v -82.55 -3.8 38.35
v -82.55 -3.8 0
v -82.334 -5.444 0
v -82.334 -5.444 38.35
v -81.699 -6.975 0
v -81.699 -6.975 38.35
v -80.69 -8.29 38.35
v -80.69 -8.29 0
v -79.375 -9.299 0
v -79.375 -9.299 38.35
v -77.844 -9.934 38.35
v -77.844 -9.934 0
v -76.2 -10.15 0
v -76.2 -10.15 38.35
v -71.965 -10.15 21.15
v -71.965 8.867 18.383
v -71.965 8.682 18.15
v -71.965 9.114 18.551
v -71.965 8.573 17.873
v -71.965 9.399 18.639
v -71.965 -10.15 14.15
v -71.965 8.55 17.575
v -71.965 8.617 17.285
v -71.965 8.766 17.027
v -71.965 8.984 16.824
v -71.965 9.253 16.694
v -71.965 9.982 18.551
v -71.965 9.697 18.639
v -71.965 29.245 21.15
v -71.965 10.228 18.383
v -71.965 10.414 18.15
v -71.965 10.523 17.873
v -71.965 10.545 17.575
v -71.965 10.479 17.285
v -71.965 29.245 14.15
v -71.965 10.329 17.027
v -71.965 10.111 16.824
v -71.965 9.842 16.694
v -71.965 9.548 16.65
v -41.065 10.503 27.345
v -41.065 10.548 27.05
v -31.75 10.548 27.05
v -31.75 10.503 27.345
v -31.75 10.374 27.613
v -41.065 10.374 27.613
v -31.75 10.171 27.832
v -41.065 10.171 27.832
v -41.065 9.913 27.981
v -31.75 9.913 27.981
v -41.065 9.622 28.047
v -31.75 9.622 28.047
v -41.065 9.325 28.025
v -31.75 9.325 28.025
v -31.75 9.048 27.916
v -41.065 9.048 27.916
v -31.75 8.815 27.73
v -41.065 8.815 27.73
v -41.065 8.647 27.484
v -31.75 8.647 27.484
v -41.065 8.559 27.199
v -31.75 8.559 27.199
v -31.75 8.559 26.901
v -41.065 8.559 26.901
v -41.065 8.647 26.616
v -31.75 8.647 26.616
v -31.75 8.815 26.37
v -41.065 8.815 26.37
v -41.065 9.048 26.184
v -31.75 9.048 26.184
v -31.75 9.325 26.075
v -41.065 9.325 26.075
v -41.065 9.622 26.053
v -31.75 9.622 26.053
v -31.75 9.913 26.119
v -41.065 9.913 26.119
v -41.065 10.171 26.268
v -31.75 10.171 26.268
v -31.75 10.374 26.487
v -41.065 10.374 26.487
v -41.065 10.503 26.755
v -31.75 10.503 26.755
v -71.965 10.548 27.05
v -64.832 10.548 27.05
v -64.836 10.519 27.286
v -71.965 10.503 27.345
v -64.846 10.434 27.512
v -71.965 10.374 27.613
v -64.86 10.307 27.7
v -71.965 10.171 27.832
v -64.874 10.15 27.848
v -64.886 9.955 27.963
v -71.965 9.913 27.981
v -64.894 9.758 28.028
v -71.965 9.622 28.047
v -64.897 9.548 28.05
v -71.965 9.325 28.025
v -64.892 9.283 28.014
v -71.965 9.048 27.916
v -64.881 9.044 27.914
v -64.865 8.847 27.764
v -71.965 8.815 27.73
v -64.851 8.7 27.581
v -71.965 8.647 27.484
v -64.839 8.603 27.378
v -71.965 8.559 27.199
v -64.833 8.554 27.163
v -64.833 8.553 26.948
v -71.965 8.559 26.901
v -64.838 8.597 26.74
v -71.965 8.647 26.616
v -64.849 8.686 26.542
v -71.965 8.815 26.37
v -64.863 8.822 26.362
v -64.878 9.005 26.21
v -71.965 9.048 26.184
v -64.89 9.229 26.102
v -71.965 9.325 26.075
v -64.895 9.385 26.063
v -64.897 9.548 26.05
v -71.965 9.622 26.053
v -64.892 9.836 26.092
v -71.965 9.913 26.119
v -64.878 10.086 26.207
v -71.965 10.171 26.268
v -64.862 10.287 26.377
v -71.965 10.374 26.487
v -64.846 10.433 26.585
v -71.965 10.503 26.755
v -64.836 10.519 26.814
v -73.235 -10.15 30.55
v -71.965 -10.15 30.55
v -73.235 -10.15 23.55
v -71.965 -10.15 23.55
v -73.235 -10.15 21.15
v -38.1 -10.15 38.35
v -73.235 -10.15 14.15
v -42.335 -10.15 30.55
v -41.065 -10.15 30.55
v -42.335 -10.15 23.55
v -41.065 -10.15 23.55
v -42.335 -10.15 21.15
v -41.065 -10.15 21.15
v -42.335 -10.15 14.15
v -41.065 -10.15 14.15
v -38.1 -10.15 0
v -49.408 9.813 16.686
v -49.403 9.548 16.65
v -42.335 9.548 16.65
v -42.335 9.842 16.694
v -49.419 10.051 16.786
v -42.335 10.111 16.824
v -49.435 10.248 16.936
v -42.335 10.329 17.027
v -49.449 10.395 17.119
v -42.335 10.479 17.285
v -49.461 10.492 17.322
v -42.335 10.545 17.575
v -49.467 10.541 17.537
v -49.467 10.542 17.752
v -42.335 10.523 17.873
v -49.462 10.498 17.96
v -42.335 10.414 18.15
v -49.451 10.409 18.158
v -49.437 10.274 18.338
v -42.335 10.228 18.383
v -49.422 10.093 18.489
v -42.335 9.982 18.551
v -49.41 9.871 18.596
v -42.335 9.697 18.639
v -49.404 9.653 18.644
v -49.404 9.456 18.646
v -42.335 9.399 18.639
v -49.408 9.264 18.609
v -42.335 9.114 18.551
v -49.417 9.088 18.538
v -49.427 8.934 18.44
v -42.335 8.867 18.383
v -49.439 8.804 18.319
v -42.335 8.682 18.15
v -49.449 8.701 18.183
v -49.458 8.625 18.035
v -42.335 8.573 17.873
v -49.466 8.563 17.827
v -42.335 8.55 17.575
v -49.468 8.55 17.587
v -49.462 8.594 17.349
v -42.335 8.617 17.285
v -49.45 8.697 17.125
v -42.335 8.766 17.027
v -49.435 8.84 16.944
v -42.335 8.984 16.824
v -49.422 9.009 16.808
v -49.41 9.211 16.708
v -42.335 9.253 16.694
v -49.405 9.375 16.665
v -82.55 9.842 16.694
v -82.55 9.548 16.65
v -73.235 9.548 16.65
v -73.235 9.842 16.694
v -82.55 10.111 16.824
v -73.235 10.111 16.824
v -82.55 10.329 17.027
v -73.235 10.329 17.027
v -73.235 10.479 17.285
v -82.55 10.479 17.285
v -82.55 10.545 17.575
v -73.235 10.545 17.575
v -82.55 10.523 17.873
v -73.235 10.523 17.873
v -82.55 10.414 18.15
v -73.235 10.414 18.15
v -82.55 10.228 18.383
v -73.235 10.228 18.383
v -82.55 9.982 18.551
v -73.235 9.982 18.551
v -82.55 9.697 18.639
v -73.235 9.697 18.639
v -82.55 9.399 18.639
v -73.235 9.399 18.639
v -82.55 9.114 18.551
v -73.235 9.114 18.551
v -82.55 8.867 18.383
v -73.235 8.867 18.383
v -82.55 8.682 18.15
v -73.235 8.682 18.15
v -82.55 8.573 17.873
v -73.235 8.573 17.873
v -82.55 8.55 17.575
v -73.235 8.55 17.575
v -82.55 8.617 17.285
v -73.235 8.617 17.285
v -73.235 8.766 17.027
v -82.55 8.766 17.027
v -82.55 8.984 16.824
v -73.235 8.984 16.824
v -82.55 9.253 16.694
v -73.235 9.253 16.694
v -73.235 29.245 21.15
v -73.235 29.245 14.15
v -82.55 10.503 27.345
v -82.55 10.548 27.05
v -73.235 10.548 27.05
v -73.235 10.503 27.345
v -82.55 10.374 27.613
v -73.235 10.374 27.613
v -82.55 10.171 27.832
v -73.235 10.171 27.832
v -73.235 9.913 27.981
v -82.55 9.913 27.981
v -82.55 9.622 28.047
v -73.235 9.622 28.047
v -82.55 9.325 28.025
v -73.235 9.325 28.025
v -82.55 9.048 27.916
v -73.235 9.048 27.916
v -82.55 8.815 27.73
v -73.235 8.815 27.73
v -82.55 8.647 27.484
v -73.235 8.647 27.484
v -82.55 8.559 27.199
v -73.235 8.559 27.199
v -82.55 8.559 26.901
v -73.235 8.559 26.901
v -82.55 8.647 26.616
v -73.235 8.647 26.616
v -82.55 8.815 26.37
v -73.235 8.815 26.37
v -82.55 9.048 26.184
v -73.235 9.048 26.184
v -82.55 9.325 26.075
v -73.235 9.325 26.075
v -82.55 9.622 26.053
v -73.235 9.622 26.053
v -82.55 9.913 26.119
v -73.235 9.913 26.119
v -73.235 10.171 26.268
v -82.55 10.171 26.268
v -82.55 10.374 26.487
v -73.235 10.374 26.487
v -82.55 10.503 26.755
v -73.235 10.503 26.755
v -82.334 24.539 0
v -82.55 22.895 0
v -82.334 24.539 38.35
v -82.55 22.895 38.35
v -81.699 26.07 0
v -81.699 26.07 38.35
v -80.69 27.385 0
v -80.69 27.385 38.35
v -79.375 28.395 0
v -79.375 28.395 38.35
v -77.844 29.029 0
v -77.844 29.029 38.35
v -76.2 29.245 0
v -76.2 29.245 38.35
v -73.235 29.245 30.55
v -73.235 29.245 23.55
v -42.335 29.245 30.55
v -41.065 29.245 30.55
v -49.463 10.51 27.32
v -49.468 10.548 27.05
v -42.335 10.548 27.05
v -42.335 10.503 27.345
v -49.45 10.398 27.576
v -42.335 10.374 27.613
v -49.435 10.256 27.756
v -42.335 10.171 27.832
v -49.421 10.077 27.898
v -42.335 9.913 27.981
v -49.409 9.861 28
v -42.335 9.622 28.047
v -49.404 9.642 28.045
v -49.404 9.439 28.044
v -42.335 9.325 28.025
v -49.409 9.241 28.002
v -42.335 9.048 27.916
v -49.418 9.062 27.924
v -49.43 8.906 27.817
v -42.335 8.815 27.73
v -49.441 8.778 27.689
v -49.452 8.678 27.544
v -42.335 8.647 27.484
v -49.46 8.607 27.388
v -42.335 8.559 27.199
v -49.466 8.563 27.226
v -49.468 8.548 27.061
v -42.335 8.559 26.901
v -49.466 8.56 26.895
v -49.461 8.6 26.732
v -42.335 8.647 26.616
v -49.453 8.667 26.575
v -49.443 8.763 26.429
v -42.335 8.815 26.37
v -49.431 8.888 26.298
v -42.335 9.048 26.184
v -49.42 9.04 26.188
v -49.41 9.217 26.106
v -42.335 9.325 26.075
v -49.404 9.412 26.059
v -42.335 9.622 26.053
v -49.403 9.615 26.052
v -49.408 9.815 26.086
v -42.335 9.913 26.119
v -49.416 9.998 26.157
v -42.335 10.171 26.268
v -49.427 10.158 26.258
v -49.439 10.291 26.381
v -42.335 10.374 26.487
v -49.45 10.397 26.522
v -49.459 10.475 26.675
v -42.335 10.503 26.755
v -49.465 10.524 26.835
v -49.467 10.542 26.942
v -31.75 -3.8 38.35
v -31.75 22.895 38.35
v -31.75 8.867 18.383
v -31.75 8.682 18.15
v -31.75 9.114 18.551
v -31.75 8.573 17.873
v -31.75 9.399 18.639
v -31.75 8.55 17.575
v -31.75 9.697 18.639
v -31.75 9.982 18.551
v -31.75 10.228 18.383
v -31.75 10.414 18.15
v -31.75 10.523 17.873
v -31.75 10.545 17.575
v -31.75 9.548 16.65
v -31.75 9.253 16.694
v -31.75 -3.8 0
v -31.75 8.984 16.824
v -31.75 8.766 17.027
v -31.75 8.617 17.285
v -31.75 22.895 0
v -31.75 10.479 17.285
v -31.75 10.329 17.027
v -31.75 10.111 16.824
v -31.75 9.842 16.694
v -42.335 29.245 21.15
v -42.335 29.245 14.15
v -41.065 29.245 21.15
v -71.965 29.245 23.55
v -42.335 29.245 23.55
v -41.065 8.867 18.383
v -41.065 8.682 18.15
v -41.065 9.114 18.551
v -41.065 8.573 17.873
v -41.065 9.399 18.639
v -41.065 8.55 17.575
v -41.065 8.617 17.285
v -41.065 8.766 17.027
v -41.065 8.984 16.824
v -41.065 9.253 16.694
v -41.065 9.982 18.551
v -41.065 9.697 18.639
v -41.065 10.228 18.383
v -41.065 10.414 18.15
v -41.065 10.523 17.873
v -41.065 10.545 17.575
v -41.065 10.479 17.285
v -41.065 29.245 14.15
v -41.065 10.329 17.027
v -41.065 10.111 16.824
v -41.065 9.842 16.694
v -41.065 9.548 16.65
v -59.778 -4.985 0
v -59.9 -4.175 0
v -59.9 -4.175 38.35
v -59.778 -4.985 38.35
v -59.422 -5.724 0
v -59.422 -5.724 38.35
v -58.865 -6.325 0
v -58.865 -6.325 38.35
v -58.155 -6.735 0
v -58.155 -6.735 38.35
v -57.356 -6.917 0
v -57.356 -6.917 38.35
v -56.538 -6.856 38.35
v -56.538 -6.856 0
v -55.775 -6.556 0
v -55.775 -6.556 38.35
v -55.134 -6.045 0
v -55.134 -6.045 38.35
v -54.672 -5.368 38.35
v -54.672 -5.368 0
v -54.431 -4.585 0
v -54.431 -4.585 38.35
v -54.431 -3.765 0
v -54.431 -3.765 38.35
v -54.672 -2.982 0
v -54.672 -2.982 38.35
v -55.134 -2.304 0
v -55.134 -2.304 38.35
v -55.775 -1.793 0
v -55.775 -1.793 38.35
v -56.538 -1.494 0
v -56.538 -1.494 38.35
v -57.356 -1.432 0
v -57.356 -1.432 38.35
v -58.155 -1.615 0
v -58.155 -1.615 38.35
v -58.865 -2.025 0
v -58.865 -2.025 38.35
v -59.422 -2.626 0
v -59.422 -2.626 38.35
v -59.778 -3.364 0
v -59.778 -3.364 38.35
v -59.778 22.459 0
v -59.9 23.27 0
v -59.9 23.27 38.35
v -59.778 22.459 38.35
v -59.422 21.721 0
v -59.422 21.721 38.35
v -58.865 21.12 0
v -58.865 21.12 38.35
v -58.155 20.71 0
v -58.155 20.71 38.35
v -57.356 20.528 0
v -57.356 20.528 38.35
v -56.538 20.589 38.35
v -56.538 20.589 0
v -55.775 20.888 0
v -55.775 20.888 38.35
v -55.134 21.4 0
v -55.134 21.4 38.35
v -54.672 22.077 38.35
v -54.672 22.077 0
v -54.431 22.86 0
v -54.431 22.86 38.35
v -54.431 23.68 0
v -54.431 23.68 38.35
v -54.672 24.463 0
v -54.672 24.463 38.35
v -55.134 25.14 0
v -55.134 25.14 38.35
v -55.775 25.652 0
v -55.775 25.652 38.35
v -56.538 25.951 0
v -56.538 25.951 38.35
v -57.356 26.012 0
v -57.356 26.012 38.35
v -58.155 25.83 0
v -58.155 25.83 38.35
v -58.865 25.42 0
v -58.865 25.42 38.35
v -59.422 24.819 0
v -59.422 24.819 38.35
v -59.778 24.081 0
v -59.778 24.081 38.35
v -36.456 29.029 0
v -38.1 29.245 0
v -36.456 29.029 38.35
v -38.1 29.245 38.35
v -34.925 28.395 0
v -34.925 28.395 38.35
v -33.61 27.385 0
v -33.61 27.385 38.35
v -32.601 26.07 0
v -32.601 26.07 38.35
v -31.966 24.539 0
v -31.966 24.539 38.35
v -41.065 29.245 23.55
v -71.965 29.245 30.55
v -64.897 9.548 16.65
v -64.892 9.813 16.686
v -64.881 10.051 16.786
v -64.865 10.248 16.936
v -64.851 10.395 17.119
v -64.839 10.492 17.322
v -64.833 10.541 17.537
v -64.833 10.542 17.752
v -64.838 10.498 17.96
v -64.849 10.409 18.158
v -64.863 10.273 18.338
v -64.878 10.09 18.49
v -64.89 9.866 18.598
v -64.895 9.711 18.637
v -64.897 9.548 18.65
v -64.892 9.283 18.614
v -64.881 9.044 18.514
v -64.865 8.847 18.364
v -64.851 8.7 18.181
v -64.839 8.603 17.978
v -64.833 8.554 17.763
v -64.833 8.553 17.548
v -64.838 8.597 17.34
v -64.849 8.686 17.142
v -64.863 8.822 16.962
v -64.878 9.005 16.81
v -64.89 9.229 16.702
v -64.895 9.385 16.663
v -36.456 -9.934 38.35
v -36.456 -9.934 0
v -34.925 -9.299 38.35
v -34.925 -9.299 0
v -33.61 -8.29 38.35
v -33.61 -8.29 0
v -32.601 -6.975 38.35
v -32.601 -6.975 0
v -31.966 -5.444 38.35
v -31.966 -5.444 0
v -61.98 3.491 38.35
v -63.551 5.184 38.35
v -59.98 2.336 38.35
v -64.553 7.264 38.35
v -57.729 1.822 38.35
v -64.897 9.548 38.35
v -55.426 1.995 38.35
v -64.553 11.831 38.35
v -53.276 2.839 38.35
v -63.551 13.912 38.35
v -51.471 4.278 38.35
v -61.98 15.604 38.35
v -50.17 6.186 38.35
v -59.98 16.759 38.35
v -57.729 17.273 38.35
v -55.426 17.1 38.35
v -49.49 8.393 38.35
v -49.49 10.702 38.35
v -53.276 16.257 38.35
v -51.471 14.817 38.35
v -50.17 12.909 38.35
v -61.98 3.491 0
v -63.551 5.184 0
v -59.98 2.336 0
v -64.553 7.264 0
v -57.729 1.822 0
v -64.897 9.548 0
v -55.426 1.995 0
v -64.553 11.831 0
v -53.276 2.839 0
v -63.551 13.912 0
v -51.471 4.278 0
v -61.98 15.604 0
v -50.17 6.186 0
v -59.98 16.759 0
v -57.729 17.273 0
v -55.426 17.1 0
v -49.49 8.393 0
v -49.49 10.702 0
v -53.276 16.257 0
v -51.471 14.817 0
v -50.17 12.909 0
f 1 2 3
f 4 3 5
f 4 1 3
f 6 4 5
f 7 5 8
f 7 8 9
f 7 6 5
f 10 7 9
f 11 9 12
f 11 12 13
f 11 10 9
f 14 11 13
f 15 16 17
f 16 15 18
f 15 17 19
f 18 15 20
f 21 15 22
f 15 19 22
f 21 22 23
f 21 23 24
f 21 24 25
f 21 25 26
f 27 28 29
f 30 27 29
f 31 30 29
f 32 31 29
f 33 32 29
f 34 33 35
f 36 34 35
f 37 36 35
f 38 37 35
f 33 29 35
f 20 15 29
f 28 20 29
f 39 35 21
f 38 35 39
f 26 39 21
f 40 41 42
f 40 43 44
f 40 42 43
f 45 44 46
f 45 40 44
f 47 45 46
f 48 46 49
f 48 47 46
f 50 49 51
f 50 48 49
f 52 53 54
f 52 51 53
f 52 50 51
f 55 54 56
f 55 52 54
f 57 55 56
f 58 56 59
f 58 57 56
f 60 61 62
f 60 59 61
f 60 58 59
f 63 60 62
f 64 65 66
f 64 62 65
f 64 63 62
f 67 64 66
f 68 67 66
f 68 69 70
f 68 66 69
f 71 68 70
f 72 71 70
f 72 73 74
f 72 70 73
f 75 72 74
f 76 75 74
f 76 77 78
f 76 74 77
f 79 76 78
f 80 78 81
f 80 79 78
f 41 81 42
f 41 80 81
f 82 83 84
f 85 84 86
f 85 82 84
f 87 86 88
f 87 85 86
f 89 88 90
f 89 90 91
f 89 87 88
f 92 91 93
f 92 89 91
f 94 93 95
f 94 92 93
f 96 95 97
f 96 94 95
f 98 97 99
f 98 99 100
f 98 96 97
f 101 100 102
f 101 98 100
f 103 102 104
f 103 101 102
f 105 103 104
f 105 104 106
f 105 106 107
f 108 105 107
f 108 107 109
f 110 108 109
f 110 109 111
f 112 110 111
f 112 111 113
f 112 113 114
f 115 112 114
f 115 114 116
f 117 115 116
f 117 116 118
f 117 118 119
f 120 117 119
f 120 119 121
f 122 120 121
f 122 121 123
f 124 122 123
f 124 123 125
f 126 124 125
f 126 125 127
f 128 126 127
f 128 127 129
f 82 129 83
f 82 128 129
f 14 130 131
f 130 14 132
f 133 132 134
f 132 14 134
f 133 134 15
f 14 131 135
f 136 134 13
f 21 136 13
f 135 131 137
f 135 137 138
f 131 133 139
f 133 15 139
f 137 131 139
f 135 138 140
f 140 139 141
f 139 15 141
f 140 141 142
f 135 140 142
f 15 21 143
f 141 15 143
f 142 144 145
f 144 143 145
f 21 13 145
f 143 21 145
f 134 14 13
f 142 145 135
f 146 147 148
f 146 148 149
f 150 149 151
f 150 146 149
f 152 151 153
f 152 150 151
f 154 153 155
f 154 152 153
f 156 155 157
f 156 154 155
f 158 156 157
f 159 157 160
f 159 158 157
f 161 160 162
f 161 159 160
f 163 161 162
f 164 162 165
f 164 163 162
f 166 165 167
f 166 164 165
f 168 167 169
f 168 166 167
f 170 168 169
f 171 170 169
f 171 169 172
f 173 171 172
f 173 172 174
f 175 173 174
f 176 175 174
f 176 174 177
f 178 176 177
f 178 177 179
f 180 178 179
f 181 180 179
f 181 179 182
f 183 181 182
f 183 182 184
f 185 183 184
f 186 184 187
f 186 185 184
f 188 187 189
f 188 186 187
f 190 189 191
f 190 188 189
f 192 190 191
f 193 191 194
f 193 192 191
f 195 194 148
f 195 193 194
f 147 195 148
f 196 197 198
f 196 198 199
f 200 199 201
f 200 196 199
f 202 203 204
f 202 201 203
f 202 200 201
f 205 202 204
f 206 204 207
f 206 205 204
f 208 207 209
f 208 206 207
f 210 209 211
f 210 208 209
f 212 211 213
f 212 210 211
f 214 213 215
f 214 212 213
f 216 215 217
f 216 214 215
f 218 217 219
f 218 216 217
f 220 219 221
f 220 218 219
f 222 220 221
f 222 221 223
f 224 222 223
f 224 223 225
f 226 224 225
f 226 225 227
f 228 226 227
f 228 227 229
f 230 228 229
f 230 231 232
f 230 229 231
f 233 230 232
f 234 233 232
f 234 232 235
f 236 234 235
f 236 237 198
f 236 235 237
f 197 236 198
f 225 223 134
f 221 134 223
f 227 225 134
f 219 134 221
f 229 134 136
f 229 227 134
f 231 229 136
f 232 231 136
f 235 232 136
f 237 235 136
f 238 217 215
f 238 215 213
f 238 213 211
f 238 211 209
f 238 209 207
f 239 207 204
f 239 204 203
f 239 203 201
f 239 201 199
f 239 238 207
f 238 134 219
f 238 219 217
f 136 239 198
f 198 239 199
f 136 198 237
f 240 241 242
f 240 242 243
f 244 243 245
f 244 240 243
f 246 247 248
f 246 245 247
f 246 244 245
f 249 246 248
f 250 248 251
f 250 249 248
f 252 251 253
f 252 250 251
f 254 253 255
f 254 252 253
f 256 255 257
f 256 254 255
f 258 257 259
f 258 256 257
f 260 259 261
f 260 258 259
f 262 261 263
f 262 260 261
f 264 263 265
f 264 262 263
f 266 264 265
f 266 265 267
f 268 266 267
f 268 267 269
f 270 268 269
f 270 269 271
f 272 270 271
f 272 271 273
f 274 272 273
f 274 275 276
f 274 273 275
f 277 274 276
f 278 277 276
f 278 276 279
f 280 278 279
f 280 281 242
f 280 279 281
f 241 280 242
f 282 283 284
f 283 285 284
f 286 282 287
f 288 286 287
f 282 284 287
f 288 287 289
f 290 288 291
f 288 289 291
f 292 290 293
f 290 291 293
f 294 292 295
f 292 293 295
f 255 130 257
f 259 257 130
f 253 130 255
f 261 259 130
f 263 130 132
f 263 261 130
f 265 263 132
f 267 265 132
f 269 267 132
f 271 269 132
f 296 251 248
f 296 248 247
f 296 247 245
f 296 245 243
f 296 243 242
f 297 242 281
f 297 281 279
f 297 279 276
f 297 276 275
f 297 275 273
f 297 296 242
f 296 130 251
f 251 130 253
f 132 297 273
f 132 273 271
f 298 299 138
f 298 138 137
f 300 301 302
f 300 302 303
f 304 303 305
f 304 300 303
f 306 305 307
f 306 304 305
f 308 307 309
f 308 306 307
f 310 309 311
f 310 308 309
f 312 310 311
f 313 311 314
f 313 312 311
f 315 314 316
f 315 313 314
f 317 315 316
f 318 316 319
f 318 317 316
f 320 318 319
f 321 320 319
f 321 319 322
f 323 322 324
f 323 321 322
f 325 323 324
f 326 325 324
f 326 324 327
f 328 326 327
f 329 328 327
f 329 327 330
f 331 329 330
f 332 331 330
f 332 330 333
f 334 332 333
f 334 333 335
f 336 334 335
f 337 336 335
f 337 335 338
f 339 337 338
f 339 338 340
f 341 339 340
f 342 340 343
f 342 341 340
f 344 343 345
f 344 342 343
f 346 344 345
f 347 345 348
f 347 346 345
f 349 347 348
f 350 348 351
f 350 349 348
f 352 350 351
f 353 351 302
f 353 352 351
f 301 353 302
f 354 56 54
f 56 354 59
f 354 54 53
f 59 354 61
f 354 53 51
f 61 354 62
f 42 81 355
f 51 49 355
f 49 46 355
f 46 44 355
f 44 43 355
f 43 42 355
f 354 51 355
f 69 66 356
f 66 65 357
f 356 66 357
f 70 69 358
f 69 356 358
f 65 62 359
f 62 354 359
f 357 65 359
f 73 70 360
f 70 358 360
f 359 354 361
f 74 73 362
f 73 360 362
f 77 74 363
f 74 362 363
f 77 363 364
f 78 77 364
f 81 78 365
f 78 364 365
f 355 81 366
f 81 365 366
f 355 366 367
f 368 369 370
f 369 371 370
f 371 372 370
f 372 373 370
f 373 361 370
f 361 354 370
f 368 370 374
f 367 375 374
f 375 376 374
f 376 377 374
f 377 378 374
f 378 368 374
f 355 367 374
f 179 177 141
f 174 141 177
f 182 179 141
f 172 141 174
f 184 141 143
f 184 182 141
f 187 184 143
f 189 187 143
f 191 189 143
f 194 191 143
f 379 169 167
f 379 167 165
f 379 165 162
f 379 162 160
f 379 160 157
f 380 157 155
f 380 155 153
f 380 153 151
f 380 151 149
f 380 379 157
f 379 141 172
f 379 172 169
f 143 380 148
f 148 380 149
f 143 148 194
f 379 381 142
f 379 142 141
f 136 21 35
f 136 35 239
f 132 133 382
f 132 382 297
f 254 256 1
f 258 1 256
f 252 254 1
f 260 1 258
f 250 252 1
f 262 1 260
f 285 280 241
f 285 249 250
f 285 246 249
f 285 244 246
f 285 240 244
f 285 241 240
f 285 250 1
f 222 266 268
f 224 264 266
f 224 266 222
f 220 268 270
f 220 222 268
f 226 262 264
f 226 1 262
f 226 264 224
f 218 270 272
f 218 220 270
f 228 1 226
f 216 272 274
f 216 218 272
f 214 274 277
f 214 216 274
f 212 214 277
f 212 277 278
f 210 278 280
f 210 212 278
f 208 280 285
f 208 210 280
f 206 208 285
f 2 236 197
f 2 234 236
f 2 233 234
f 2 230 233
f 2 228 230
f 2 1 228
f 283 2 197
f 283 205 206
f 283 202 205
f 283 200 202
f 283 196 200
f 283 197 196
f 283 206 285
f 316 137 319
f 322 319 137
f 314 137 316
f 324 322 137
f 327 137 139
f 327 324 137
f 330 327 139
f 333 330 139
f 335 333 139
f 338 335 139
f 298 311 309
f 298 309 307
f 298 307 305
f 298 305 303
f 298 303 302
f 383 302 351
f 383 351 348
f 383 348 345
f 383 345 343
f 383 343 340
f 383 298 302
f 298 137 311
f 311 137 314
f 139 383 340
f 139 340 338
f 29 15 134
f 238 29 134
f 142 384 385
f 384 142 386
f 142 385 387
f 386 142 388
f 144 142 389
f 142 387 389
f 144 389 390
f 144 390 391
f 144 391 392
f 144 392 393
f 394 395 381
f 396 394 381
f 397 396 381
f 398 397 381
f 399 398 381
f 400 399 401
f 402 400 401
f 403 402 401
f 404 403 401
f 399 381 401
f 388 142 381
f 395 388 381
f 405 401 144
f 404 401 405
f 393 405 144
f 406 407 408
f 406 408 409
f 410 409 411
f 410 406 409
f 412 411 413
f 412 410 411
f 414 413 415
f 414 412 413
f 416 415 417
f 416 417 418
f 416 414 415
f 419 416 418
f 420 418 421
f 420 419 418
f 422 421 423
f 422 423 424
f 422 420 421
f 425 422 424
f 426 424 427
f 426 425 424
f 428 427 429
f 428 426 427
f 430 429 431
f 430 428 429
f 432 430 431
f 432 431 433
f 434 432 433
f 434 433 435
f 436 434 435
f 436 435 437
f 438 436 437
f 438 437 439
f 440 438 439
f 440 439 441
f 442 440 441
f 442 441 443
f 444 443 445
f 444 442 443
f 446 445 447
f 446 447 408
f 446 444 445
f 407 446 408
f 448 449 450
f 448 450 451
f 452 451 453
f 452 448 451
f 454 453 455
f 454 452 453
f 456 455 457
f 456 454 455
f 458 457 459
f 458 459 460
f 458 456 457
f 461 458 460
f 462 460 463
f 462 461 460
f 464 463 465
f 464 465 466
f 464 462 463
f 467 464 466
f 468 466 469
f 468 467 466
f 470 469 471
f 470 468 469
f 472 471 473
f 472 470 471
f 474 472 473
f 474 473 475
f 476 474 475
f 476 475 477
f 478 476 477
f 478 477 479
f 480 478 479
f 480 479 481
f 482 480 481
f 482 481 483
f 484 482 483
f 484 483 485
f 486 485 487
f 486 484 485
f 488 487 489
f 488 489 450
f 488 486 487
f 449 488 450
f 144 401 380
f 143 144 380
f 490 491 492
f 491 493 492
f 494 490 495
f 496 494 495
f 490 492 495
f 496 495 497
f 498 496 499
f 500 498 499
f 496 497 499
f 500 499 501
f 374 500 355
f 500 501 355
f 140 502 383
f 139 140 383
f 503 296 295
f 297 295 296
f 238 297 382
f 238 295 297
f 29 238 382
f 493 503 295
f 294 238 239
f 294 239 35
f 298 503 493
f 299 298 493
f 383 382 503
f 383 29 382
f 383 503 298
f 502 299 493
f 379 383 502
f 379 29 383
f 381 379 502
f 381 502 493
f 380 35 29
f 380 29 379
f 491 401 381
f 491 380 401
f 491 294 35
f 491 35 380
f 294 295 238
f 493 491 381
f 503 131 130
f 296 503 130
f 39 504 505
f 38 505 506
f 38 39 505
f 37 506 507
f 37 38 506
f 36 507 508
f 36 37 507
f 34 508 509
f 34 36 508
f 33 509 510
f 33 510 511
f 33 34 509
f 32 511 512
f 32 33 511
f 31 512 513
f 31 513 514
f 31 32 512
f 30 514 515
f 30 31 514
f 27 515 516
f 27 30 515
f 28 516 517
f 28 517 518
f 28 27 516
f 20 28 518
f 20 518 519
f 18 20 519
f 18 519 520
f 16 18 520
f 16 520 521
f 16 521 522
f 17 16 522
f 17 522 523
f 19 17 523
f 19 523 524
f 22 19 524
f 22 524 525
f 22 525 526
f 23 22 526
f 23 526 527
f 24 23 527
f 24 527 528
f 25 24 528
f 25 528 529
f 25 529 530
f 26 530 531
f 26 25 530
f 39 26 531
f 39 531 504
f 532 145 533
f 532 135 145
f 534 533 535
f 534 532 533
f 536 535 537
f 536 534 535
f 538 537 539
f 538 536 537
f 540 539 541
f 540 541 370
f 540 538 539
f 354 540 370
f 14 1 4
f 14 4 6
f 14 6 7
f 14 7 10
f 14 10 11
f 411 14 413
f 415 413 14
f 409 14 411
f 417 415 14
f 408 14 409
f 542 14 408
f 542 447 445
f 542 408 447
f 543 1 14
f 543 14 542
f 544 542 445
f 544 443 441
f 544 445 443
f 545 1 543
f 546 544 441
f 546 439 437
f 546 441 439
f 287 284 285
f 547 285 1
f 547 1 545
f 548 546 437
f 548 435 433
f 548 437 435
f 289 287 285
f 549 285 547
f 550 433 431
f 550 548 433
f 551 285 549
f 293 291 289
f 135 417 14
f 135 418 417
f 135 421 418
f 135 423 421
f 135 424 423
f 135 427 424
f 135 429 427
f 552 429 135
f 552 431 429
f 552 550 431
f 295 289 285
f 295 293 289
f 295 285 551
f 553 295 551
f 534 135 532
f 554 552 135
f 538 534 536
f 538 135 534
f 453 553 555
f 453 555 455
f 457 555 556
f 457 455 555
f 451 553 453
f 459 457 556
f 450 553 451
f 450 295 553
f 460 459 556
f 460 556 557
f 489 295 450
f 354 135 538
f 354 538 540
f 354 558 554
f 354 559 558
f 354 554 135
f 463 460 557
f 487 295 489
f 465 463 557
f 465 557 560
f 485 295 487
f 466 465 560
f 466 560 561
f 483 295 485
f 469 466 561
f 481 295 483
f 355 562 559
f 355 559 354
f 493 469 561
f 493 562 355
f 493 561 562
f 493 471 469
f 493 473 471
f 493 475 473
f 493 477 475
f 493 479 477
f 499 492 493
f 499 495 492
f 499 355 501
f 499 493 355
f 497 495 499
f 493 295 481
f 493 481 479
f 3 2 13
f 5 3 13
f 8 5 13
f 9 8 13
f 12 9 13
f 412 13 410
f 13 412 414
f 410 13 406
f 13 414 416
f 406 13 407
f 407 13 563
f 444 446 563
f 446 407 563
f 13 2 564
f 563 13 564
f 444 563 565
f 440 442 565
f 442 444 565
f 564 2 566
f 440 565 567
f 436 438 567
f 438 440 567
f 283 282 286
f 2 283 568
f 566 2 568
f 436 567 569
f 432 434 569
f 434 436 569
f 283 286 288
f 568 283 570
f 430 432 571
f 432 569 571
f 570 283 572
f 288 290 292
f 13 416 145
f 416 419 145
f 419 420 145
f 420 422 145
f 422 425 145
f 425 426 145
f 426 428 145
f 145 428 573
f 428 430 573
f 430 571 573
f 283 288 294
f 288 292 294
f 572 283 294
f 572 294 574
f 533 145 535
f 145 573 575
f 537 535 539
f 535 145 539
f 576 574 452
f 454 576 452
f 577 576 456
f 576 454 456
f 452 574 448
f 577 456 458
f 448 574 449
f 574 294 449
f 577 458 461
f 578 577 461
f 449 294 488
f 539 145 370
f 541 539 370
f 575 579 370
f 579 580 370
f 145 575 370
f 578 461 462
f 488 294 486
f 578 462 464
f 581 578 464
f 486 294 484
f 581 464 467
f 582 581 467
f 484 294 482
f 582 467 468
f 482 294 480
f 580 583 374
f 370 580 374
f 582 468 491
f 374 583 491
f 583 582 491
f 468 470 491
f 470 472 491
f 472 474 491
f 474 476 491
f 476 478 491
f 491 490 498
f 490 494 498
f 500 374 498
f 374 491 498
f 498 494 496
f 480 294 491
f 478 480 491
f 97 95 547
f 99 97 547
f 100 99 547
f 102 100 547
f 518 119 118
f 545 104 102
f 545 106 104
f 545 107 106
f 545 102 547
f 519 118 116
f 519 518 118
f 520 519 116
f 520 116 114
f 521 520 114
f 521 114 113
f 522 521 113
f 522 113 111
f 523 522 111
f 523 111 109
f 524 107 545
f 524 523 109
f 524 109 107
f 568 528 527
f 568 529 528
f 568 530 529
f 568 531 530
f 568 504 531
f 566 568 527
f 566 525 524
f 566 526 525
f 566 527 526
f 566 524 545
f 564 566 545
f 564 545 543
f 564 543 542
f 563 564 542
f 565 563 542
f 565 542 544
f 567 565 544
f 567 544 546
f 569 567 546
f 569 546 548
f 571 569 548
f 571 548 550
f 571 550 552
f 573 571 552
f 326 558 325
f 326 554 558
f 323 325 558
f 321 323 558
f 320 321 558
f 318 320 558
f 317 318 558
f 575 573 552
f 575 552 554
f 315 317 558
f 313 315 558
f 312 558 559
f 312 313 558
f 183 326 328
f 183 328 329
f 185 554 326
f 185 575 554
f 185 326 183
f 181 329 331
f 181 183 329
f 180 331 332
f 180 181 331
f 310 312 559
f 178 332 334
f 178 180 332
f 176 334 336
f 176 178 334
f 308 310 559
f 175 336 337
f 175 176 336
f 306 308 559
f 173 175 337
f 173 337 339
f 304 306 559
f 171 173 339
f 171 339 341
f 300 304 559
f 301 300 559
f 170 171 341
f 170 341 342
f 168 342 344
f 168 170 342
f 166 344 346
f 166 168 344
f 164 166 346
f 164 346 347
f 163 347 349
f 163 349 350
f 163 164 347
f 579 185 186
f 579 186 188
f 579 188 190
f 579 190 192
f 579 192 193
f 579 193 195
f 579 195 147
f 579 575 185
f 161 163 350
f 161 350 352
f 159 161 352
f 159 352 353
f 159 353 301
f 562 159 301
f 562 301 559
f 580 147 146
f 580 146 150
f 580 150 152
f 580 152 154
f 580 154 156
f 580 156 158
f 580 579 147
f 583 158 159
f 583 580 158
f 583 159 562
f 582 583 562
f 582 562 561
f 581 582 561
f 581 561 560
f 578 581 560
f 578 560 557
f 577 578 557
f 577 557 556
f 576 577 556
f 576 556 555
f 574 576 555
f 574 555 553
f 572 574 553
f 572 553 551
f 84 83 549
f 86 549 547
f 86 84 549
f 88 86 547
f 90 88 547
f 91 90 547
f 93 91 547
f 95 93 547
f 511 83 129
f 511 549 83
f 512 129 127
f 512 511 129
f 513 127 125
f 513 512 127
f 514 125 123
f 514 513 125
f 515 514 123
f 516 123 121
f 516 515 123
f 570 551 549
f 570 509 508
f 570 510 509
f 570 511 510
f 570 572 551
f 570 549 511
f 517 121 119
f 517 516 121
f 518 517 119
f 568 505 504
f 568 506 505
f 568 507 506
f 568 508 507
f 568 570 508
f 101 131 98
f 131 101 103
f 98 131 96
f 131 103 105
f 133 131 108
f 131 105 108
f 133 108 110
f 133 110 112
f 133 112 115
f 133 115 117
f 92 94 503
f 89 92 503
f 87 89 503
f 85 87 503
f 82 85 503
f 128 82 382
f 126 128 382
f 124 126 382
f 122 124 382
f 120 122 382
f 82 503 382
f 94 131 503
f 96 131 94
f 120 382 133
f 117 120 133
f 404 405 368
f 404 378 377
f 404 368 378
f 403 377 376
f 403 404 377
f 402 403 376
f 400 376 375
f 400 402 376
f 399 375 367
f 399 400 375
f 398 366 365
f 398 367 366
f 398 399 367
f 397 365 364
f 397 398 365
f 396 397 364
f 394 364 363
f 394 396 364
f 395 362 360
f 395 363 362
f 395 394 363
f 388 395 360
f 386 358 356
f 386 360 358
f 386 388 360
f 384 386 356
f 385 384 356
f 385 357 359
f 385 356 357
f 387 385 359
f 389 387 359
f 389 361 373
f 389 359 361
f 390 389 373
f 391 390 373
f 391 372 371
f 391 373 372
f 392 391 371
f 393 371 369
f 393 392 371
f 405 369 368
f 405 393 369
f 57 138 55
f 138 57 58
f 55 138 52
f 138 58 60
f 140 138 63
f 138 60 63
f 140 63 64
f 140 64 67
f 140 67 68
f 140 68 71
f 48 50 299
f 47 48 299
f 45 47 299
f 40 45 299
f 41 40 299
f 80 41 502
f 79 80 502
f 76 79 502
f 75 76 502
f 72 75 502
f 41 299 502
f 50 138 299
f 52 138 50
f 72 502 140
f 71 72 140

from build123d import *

# Parameters (mm, degrees)
SKETCH1_W               = 50.8
SKETCH1_H               = 39.395334333
SKETCH1_R               = 2.75
SKETCH1_R_2             = 7.747
BOSS_EXTRUDE1_DEPTH     = 38.35
CUT_EXTRUDE1_DEPTH      = 100.182747326
CUT_EXTRUDE1_DEPTH_BACK = 100.182747326
SKETCH2_W               = 1.27
SKETCH2_H               = 7
CUT_EXTRUDE2_DEPTH      = 71.04748878
CUT_EXTRUDE2_DEPTH_BACK = 71.04748878
SKETCH3_R               = 1
FILLET1_R               = 6.35


with BuildPart() as part:
    # Sketch1 → Boss-Extrude1 (new body)
    with BuildSketch(Plane.XY):
        with Locations((-57.15, 9.547643302)):
            Rectangle(SKETCH1_W, SKETCH1_H)
        with Locations(Location((-57.15, 23.269976885, 0), (0, 0, 180))):
            Circle(SKETCH1_R, mode=Mode.SUBTRACT)
        with Locations(Location((-57.15, -4.174690282, 0), (0, 0, 180))):
            Circle(SKETCH1_R, mode=Mode.SUBTRACT)
        with Locations(Location((-57.15, 9.547643302, 0), (0, 0, 180))):
            Circle(SKETCH1_R_2, mode=Mode.SUBTRACT)
    extrude(amount=BOSS_EXTRUDE1_DEPTH)

    # Sketch2 → Cut-Extrude1 (cut, two sides: drawn at the far end of the back side and taken through both)
    with BuildSketch(Plane(origin=(0, -10.150023865, 0), x_dir=(-1, 0, 0), z_dir=(0, -1, 0)).offset(-CUT_EXTRUDE1_DEPTH_BACK)):
        with Locations((72.6, -17.65)):
            Rectangle(SKETCH2_W, SKETCH2_H)
        with Locations((41.7, -27.05)):
            Rectangle(SKETCH2_W, SKETCH2_H)
        with Locations((41.7, -17.65)):
            Rectangle(SKETCH2_W, SKETCH2_H)
        with Locations((72.6, -27.05)):
            Rectangle(SKETCH2_W, SKETCH2_H)
    extrude(amount=CUT_EXTRUDE1_DEPTH + CUT_EXTRUDE1_DEPTH_BACK, mode=Mode.SUBTRACT)

    # Sketch3 → Cut-Extrude2 (cut, two sides: drawn at the far end of the back side and taken through both)
    with BuildSketch(Plane(origin=(-31.75, 0, 0), x_dir=(0, 0, -1), z_dir=(1, 0, 0)).offset(-CUT_EXTRUDE2_DEPTH_BACK)):
        with Locations((-17.65, 9.547643302)):
            Circle(SKETCH3_R)
        with Locations(Location((-27.05, 9.547643302, 0), (0, 0, 90))):
            Circle(SKETCH3_R)
    extrude(amount=CUT_EXTRUDE2_DEPTH + CUT_EXTRUDE2_DEPTH_BACK, mode=Mode.SUBTRACT)

    # Fillet1
    fillet1_edges = [part.edges().sort_by_distance(p)[0] for p in [
        (-31.75, -10.150023865, 19.175),
        (-82.55, -10.150023865, 19.175),
        (-82.55, 29.245310468, 19.175),
        (-31.75, 29.245310468, 19.175),
    ]]
    fillet(fillet1_edges, radius=FILLET1_R)


solid = part.part
